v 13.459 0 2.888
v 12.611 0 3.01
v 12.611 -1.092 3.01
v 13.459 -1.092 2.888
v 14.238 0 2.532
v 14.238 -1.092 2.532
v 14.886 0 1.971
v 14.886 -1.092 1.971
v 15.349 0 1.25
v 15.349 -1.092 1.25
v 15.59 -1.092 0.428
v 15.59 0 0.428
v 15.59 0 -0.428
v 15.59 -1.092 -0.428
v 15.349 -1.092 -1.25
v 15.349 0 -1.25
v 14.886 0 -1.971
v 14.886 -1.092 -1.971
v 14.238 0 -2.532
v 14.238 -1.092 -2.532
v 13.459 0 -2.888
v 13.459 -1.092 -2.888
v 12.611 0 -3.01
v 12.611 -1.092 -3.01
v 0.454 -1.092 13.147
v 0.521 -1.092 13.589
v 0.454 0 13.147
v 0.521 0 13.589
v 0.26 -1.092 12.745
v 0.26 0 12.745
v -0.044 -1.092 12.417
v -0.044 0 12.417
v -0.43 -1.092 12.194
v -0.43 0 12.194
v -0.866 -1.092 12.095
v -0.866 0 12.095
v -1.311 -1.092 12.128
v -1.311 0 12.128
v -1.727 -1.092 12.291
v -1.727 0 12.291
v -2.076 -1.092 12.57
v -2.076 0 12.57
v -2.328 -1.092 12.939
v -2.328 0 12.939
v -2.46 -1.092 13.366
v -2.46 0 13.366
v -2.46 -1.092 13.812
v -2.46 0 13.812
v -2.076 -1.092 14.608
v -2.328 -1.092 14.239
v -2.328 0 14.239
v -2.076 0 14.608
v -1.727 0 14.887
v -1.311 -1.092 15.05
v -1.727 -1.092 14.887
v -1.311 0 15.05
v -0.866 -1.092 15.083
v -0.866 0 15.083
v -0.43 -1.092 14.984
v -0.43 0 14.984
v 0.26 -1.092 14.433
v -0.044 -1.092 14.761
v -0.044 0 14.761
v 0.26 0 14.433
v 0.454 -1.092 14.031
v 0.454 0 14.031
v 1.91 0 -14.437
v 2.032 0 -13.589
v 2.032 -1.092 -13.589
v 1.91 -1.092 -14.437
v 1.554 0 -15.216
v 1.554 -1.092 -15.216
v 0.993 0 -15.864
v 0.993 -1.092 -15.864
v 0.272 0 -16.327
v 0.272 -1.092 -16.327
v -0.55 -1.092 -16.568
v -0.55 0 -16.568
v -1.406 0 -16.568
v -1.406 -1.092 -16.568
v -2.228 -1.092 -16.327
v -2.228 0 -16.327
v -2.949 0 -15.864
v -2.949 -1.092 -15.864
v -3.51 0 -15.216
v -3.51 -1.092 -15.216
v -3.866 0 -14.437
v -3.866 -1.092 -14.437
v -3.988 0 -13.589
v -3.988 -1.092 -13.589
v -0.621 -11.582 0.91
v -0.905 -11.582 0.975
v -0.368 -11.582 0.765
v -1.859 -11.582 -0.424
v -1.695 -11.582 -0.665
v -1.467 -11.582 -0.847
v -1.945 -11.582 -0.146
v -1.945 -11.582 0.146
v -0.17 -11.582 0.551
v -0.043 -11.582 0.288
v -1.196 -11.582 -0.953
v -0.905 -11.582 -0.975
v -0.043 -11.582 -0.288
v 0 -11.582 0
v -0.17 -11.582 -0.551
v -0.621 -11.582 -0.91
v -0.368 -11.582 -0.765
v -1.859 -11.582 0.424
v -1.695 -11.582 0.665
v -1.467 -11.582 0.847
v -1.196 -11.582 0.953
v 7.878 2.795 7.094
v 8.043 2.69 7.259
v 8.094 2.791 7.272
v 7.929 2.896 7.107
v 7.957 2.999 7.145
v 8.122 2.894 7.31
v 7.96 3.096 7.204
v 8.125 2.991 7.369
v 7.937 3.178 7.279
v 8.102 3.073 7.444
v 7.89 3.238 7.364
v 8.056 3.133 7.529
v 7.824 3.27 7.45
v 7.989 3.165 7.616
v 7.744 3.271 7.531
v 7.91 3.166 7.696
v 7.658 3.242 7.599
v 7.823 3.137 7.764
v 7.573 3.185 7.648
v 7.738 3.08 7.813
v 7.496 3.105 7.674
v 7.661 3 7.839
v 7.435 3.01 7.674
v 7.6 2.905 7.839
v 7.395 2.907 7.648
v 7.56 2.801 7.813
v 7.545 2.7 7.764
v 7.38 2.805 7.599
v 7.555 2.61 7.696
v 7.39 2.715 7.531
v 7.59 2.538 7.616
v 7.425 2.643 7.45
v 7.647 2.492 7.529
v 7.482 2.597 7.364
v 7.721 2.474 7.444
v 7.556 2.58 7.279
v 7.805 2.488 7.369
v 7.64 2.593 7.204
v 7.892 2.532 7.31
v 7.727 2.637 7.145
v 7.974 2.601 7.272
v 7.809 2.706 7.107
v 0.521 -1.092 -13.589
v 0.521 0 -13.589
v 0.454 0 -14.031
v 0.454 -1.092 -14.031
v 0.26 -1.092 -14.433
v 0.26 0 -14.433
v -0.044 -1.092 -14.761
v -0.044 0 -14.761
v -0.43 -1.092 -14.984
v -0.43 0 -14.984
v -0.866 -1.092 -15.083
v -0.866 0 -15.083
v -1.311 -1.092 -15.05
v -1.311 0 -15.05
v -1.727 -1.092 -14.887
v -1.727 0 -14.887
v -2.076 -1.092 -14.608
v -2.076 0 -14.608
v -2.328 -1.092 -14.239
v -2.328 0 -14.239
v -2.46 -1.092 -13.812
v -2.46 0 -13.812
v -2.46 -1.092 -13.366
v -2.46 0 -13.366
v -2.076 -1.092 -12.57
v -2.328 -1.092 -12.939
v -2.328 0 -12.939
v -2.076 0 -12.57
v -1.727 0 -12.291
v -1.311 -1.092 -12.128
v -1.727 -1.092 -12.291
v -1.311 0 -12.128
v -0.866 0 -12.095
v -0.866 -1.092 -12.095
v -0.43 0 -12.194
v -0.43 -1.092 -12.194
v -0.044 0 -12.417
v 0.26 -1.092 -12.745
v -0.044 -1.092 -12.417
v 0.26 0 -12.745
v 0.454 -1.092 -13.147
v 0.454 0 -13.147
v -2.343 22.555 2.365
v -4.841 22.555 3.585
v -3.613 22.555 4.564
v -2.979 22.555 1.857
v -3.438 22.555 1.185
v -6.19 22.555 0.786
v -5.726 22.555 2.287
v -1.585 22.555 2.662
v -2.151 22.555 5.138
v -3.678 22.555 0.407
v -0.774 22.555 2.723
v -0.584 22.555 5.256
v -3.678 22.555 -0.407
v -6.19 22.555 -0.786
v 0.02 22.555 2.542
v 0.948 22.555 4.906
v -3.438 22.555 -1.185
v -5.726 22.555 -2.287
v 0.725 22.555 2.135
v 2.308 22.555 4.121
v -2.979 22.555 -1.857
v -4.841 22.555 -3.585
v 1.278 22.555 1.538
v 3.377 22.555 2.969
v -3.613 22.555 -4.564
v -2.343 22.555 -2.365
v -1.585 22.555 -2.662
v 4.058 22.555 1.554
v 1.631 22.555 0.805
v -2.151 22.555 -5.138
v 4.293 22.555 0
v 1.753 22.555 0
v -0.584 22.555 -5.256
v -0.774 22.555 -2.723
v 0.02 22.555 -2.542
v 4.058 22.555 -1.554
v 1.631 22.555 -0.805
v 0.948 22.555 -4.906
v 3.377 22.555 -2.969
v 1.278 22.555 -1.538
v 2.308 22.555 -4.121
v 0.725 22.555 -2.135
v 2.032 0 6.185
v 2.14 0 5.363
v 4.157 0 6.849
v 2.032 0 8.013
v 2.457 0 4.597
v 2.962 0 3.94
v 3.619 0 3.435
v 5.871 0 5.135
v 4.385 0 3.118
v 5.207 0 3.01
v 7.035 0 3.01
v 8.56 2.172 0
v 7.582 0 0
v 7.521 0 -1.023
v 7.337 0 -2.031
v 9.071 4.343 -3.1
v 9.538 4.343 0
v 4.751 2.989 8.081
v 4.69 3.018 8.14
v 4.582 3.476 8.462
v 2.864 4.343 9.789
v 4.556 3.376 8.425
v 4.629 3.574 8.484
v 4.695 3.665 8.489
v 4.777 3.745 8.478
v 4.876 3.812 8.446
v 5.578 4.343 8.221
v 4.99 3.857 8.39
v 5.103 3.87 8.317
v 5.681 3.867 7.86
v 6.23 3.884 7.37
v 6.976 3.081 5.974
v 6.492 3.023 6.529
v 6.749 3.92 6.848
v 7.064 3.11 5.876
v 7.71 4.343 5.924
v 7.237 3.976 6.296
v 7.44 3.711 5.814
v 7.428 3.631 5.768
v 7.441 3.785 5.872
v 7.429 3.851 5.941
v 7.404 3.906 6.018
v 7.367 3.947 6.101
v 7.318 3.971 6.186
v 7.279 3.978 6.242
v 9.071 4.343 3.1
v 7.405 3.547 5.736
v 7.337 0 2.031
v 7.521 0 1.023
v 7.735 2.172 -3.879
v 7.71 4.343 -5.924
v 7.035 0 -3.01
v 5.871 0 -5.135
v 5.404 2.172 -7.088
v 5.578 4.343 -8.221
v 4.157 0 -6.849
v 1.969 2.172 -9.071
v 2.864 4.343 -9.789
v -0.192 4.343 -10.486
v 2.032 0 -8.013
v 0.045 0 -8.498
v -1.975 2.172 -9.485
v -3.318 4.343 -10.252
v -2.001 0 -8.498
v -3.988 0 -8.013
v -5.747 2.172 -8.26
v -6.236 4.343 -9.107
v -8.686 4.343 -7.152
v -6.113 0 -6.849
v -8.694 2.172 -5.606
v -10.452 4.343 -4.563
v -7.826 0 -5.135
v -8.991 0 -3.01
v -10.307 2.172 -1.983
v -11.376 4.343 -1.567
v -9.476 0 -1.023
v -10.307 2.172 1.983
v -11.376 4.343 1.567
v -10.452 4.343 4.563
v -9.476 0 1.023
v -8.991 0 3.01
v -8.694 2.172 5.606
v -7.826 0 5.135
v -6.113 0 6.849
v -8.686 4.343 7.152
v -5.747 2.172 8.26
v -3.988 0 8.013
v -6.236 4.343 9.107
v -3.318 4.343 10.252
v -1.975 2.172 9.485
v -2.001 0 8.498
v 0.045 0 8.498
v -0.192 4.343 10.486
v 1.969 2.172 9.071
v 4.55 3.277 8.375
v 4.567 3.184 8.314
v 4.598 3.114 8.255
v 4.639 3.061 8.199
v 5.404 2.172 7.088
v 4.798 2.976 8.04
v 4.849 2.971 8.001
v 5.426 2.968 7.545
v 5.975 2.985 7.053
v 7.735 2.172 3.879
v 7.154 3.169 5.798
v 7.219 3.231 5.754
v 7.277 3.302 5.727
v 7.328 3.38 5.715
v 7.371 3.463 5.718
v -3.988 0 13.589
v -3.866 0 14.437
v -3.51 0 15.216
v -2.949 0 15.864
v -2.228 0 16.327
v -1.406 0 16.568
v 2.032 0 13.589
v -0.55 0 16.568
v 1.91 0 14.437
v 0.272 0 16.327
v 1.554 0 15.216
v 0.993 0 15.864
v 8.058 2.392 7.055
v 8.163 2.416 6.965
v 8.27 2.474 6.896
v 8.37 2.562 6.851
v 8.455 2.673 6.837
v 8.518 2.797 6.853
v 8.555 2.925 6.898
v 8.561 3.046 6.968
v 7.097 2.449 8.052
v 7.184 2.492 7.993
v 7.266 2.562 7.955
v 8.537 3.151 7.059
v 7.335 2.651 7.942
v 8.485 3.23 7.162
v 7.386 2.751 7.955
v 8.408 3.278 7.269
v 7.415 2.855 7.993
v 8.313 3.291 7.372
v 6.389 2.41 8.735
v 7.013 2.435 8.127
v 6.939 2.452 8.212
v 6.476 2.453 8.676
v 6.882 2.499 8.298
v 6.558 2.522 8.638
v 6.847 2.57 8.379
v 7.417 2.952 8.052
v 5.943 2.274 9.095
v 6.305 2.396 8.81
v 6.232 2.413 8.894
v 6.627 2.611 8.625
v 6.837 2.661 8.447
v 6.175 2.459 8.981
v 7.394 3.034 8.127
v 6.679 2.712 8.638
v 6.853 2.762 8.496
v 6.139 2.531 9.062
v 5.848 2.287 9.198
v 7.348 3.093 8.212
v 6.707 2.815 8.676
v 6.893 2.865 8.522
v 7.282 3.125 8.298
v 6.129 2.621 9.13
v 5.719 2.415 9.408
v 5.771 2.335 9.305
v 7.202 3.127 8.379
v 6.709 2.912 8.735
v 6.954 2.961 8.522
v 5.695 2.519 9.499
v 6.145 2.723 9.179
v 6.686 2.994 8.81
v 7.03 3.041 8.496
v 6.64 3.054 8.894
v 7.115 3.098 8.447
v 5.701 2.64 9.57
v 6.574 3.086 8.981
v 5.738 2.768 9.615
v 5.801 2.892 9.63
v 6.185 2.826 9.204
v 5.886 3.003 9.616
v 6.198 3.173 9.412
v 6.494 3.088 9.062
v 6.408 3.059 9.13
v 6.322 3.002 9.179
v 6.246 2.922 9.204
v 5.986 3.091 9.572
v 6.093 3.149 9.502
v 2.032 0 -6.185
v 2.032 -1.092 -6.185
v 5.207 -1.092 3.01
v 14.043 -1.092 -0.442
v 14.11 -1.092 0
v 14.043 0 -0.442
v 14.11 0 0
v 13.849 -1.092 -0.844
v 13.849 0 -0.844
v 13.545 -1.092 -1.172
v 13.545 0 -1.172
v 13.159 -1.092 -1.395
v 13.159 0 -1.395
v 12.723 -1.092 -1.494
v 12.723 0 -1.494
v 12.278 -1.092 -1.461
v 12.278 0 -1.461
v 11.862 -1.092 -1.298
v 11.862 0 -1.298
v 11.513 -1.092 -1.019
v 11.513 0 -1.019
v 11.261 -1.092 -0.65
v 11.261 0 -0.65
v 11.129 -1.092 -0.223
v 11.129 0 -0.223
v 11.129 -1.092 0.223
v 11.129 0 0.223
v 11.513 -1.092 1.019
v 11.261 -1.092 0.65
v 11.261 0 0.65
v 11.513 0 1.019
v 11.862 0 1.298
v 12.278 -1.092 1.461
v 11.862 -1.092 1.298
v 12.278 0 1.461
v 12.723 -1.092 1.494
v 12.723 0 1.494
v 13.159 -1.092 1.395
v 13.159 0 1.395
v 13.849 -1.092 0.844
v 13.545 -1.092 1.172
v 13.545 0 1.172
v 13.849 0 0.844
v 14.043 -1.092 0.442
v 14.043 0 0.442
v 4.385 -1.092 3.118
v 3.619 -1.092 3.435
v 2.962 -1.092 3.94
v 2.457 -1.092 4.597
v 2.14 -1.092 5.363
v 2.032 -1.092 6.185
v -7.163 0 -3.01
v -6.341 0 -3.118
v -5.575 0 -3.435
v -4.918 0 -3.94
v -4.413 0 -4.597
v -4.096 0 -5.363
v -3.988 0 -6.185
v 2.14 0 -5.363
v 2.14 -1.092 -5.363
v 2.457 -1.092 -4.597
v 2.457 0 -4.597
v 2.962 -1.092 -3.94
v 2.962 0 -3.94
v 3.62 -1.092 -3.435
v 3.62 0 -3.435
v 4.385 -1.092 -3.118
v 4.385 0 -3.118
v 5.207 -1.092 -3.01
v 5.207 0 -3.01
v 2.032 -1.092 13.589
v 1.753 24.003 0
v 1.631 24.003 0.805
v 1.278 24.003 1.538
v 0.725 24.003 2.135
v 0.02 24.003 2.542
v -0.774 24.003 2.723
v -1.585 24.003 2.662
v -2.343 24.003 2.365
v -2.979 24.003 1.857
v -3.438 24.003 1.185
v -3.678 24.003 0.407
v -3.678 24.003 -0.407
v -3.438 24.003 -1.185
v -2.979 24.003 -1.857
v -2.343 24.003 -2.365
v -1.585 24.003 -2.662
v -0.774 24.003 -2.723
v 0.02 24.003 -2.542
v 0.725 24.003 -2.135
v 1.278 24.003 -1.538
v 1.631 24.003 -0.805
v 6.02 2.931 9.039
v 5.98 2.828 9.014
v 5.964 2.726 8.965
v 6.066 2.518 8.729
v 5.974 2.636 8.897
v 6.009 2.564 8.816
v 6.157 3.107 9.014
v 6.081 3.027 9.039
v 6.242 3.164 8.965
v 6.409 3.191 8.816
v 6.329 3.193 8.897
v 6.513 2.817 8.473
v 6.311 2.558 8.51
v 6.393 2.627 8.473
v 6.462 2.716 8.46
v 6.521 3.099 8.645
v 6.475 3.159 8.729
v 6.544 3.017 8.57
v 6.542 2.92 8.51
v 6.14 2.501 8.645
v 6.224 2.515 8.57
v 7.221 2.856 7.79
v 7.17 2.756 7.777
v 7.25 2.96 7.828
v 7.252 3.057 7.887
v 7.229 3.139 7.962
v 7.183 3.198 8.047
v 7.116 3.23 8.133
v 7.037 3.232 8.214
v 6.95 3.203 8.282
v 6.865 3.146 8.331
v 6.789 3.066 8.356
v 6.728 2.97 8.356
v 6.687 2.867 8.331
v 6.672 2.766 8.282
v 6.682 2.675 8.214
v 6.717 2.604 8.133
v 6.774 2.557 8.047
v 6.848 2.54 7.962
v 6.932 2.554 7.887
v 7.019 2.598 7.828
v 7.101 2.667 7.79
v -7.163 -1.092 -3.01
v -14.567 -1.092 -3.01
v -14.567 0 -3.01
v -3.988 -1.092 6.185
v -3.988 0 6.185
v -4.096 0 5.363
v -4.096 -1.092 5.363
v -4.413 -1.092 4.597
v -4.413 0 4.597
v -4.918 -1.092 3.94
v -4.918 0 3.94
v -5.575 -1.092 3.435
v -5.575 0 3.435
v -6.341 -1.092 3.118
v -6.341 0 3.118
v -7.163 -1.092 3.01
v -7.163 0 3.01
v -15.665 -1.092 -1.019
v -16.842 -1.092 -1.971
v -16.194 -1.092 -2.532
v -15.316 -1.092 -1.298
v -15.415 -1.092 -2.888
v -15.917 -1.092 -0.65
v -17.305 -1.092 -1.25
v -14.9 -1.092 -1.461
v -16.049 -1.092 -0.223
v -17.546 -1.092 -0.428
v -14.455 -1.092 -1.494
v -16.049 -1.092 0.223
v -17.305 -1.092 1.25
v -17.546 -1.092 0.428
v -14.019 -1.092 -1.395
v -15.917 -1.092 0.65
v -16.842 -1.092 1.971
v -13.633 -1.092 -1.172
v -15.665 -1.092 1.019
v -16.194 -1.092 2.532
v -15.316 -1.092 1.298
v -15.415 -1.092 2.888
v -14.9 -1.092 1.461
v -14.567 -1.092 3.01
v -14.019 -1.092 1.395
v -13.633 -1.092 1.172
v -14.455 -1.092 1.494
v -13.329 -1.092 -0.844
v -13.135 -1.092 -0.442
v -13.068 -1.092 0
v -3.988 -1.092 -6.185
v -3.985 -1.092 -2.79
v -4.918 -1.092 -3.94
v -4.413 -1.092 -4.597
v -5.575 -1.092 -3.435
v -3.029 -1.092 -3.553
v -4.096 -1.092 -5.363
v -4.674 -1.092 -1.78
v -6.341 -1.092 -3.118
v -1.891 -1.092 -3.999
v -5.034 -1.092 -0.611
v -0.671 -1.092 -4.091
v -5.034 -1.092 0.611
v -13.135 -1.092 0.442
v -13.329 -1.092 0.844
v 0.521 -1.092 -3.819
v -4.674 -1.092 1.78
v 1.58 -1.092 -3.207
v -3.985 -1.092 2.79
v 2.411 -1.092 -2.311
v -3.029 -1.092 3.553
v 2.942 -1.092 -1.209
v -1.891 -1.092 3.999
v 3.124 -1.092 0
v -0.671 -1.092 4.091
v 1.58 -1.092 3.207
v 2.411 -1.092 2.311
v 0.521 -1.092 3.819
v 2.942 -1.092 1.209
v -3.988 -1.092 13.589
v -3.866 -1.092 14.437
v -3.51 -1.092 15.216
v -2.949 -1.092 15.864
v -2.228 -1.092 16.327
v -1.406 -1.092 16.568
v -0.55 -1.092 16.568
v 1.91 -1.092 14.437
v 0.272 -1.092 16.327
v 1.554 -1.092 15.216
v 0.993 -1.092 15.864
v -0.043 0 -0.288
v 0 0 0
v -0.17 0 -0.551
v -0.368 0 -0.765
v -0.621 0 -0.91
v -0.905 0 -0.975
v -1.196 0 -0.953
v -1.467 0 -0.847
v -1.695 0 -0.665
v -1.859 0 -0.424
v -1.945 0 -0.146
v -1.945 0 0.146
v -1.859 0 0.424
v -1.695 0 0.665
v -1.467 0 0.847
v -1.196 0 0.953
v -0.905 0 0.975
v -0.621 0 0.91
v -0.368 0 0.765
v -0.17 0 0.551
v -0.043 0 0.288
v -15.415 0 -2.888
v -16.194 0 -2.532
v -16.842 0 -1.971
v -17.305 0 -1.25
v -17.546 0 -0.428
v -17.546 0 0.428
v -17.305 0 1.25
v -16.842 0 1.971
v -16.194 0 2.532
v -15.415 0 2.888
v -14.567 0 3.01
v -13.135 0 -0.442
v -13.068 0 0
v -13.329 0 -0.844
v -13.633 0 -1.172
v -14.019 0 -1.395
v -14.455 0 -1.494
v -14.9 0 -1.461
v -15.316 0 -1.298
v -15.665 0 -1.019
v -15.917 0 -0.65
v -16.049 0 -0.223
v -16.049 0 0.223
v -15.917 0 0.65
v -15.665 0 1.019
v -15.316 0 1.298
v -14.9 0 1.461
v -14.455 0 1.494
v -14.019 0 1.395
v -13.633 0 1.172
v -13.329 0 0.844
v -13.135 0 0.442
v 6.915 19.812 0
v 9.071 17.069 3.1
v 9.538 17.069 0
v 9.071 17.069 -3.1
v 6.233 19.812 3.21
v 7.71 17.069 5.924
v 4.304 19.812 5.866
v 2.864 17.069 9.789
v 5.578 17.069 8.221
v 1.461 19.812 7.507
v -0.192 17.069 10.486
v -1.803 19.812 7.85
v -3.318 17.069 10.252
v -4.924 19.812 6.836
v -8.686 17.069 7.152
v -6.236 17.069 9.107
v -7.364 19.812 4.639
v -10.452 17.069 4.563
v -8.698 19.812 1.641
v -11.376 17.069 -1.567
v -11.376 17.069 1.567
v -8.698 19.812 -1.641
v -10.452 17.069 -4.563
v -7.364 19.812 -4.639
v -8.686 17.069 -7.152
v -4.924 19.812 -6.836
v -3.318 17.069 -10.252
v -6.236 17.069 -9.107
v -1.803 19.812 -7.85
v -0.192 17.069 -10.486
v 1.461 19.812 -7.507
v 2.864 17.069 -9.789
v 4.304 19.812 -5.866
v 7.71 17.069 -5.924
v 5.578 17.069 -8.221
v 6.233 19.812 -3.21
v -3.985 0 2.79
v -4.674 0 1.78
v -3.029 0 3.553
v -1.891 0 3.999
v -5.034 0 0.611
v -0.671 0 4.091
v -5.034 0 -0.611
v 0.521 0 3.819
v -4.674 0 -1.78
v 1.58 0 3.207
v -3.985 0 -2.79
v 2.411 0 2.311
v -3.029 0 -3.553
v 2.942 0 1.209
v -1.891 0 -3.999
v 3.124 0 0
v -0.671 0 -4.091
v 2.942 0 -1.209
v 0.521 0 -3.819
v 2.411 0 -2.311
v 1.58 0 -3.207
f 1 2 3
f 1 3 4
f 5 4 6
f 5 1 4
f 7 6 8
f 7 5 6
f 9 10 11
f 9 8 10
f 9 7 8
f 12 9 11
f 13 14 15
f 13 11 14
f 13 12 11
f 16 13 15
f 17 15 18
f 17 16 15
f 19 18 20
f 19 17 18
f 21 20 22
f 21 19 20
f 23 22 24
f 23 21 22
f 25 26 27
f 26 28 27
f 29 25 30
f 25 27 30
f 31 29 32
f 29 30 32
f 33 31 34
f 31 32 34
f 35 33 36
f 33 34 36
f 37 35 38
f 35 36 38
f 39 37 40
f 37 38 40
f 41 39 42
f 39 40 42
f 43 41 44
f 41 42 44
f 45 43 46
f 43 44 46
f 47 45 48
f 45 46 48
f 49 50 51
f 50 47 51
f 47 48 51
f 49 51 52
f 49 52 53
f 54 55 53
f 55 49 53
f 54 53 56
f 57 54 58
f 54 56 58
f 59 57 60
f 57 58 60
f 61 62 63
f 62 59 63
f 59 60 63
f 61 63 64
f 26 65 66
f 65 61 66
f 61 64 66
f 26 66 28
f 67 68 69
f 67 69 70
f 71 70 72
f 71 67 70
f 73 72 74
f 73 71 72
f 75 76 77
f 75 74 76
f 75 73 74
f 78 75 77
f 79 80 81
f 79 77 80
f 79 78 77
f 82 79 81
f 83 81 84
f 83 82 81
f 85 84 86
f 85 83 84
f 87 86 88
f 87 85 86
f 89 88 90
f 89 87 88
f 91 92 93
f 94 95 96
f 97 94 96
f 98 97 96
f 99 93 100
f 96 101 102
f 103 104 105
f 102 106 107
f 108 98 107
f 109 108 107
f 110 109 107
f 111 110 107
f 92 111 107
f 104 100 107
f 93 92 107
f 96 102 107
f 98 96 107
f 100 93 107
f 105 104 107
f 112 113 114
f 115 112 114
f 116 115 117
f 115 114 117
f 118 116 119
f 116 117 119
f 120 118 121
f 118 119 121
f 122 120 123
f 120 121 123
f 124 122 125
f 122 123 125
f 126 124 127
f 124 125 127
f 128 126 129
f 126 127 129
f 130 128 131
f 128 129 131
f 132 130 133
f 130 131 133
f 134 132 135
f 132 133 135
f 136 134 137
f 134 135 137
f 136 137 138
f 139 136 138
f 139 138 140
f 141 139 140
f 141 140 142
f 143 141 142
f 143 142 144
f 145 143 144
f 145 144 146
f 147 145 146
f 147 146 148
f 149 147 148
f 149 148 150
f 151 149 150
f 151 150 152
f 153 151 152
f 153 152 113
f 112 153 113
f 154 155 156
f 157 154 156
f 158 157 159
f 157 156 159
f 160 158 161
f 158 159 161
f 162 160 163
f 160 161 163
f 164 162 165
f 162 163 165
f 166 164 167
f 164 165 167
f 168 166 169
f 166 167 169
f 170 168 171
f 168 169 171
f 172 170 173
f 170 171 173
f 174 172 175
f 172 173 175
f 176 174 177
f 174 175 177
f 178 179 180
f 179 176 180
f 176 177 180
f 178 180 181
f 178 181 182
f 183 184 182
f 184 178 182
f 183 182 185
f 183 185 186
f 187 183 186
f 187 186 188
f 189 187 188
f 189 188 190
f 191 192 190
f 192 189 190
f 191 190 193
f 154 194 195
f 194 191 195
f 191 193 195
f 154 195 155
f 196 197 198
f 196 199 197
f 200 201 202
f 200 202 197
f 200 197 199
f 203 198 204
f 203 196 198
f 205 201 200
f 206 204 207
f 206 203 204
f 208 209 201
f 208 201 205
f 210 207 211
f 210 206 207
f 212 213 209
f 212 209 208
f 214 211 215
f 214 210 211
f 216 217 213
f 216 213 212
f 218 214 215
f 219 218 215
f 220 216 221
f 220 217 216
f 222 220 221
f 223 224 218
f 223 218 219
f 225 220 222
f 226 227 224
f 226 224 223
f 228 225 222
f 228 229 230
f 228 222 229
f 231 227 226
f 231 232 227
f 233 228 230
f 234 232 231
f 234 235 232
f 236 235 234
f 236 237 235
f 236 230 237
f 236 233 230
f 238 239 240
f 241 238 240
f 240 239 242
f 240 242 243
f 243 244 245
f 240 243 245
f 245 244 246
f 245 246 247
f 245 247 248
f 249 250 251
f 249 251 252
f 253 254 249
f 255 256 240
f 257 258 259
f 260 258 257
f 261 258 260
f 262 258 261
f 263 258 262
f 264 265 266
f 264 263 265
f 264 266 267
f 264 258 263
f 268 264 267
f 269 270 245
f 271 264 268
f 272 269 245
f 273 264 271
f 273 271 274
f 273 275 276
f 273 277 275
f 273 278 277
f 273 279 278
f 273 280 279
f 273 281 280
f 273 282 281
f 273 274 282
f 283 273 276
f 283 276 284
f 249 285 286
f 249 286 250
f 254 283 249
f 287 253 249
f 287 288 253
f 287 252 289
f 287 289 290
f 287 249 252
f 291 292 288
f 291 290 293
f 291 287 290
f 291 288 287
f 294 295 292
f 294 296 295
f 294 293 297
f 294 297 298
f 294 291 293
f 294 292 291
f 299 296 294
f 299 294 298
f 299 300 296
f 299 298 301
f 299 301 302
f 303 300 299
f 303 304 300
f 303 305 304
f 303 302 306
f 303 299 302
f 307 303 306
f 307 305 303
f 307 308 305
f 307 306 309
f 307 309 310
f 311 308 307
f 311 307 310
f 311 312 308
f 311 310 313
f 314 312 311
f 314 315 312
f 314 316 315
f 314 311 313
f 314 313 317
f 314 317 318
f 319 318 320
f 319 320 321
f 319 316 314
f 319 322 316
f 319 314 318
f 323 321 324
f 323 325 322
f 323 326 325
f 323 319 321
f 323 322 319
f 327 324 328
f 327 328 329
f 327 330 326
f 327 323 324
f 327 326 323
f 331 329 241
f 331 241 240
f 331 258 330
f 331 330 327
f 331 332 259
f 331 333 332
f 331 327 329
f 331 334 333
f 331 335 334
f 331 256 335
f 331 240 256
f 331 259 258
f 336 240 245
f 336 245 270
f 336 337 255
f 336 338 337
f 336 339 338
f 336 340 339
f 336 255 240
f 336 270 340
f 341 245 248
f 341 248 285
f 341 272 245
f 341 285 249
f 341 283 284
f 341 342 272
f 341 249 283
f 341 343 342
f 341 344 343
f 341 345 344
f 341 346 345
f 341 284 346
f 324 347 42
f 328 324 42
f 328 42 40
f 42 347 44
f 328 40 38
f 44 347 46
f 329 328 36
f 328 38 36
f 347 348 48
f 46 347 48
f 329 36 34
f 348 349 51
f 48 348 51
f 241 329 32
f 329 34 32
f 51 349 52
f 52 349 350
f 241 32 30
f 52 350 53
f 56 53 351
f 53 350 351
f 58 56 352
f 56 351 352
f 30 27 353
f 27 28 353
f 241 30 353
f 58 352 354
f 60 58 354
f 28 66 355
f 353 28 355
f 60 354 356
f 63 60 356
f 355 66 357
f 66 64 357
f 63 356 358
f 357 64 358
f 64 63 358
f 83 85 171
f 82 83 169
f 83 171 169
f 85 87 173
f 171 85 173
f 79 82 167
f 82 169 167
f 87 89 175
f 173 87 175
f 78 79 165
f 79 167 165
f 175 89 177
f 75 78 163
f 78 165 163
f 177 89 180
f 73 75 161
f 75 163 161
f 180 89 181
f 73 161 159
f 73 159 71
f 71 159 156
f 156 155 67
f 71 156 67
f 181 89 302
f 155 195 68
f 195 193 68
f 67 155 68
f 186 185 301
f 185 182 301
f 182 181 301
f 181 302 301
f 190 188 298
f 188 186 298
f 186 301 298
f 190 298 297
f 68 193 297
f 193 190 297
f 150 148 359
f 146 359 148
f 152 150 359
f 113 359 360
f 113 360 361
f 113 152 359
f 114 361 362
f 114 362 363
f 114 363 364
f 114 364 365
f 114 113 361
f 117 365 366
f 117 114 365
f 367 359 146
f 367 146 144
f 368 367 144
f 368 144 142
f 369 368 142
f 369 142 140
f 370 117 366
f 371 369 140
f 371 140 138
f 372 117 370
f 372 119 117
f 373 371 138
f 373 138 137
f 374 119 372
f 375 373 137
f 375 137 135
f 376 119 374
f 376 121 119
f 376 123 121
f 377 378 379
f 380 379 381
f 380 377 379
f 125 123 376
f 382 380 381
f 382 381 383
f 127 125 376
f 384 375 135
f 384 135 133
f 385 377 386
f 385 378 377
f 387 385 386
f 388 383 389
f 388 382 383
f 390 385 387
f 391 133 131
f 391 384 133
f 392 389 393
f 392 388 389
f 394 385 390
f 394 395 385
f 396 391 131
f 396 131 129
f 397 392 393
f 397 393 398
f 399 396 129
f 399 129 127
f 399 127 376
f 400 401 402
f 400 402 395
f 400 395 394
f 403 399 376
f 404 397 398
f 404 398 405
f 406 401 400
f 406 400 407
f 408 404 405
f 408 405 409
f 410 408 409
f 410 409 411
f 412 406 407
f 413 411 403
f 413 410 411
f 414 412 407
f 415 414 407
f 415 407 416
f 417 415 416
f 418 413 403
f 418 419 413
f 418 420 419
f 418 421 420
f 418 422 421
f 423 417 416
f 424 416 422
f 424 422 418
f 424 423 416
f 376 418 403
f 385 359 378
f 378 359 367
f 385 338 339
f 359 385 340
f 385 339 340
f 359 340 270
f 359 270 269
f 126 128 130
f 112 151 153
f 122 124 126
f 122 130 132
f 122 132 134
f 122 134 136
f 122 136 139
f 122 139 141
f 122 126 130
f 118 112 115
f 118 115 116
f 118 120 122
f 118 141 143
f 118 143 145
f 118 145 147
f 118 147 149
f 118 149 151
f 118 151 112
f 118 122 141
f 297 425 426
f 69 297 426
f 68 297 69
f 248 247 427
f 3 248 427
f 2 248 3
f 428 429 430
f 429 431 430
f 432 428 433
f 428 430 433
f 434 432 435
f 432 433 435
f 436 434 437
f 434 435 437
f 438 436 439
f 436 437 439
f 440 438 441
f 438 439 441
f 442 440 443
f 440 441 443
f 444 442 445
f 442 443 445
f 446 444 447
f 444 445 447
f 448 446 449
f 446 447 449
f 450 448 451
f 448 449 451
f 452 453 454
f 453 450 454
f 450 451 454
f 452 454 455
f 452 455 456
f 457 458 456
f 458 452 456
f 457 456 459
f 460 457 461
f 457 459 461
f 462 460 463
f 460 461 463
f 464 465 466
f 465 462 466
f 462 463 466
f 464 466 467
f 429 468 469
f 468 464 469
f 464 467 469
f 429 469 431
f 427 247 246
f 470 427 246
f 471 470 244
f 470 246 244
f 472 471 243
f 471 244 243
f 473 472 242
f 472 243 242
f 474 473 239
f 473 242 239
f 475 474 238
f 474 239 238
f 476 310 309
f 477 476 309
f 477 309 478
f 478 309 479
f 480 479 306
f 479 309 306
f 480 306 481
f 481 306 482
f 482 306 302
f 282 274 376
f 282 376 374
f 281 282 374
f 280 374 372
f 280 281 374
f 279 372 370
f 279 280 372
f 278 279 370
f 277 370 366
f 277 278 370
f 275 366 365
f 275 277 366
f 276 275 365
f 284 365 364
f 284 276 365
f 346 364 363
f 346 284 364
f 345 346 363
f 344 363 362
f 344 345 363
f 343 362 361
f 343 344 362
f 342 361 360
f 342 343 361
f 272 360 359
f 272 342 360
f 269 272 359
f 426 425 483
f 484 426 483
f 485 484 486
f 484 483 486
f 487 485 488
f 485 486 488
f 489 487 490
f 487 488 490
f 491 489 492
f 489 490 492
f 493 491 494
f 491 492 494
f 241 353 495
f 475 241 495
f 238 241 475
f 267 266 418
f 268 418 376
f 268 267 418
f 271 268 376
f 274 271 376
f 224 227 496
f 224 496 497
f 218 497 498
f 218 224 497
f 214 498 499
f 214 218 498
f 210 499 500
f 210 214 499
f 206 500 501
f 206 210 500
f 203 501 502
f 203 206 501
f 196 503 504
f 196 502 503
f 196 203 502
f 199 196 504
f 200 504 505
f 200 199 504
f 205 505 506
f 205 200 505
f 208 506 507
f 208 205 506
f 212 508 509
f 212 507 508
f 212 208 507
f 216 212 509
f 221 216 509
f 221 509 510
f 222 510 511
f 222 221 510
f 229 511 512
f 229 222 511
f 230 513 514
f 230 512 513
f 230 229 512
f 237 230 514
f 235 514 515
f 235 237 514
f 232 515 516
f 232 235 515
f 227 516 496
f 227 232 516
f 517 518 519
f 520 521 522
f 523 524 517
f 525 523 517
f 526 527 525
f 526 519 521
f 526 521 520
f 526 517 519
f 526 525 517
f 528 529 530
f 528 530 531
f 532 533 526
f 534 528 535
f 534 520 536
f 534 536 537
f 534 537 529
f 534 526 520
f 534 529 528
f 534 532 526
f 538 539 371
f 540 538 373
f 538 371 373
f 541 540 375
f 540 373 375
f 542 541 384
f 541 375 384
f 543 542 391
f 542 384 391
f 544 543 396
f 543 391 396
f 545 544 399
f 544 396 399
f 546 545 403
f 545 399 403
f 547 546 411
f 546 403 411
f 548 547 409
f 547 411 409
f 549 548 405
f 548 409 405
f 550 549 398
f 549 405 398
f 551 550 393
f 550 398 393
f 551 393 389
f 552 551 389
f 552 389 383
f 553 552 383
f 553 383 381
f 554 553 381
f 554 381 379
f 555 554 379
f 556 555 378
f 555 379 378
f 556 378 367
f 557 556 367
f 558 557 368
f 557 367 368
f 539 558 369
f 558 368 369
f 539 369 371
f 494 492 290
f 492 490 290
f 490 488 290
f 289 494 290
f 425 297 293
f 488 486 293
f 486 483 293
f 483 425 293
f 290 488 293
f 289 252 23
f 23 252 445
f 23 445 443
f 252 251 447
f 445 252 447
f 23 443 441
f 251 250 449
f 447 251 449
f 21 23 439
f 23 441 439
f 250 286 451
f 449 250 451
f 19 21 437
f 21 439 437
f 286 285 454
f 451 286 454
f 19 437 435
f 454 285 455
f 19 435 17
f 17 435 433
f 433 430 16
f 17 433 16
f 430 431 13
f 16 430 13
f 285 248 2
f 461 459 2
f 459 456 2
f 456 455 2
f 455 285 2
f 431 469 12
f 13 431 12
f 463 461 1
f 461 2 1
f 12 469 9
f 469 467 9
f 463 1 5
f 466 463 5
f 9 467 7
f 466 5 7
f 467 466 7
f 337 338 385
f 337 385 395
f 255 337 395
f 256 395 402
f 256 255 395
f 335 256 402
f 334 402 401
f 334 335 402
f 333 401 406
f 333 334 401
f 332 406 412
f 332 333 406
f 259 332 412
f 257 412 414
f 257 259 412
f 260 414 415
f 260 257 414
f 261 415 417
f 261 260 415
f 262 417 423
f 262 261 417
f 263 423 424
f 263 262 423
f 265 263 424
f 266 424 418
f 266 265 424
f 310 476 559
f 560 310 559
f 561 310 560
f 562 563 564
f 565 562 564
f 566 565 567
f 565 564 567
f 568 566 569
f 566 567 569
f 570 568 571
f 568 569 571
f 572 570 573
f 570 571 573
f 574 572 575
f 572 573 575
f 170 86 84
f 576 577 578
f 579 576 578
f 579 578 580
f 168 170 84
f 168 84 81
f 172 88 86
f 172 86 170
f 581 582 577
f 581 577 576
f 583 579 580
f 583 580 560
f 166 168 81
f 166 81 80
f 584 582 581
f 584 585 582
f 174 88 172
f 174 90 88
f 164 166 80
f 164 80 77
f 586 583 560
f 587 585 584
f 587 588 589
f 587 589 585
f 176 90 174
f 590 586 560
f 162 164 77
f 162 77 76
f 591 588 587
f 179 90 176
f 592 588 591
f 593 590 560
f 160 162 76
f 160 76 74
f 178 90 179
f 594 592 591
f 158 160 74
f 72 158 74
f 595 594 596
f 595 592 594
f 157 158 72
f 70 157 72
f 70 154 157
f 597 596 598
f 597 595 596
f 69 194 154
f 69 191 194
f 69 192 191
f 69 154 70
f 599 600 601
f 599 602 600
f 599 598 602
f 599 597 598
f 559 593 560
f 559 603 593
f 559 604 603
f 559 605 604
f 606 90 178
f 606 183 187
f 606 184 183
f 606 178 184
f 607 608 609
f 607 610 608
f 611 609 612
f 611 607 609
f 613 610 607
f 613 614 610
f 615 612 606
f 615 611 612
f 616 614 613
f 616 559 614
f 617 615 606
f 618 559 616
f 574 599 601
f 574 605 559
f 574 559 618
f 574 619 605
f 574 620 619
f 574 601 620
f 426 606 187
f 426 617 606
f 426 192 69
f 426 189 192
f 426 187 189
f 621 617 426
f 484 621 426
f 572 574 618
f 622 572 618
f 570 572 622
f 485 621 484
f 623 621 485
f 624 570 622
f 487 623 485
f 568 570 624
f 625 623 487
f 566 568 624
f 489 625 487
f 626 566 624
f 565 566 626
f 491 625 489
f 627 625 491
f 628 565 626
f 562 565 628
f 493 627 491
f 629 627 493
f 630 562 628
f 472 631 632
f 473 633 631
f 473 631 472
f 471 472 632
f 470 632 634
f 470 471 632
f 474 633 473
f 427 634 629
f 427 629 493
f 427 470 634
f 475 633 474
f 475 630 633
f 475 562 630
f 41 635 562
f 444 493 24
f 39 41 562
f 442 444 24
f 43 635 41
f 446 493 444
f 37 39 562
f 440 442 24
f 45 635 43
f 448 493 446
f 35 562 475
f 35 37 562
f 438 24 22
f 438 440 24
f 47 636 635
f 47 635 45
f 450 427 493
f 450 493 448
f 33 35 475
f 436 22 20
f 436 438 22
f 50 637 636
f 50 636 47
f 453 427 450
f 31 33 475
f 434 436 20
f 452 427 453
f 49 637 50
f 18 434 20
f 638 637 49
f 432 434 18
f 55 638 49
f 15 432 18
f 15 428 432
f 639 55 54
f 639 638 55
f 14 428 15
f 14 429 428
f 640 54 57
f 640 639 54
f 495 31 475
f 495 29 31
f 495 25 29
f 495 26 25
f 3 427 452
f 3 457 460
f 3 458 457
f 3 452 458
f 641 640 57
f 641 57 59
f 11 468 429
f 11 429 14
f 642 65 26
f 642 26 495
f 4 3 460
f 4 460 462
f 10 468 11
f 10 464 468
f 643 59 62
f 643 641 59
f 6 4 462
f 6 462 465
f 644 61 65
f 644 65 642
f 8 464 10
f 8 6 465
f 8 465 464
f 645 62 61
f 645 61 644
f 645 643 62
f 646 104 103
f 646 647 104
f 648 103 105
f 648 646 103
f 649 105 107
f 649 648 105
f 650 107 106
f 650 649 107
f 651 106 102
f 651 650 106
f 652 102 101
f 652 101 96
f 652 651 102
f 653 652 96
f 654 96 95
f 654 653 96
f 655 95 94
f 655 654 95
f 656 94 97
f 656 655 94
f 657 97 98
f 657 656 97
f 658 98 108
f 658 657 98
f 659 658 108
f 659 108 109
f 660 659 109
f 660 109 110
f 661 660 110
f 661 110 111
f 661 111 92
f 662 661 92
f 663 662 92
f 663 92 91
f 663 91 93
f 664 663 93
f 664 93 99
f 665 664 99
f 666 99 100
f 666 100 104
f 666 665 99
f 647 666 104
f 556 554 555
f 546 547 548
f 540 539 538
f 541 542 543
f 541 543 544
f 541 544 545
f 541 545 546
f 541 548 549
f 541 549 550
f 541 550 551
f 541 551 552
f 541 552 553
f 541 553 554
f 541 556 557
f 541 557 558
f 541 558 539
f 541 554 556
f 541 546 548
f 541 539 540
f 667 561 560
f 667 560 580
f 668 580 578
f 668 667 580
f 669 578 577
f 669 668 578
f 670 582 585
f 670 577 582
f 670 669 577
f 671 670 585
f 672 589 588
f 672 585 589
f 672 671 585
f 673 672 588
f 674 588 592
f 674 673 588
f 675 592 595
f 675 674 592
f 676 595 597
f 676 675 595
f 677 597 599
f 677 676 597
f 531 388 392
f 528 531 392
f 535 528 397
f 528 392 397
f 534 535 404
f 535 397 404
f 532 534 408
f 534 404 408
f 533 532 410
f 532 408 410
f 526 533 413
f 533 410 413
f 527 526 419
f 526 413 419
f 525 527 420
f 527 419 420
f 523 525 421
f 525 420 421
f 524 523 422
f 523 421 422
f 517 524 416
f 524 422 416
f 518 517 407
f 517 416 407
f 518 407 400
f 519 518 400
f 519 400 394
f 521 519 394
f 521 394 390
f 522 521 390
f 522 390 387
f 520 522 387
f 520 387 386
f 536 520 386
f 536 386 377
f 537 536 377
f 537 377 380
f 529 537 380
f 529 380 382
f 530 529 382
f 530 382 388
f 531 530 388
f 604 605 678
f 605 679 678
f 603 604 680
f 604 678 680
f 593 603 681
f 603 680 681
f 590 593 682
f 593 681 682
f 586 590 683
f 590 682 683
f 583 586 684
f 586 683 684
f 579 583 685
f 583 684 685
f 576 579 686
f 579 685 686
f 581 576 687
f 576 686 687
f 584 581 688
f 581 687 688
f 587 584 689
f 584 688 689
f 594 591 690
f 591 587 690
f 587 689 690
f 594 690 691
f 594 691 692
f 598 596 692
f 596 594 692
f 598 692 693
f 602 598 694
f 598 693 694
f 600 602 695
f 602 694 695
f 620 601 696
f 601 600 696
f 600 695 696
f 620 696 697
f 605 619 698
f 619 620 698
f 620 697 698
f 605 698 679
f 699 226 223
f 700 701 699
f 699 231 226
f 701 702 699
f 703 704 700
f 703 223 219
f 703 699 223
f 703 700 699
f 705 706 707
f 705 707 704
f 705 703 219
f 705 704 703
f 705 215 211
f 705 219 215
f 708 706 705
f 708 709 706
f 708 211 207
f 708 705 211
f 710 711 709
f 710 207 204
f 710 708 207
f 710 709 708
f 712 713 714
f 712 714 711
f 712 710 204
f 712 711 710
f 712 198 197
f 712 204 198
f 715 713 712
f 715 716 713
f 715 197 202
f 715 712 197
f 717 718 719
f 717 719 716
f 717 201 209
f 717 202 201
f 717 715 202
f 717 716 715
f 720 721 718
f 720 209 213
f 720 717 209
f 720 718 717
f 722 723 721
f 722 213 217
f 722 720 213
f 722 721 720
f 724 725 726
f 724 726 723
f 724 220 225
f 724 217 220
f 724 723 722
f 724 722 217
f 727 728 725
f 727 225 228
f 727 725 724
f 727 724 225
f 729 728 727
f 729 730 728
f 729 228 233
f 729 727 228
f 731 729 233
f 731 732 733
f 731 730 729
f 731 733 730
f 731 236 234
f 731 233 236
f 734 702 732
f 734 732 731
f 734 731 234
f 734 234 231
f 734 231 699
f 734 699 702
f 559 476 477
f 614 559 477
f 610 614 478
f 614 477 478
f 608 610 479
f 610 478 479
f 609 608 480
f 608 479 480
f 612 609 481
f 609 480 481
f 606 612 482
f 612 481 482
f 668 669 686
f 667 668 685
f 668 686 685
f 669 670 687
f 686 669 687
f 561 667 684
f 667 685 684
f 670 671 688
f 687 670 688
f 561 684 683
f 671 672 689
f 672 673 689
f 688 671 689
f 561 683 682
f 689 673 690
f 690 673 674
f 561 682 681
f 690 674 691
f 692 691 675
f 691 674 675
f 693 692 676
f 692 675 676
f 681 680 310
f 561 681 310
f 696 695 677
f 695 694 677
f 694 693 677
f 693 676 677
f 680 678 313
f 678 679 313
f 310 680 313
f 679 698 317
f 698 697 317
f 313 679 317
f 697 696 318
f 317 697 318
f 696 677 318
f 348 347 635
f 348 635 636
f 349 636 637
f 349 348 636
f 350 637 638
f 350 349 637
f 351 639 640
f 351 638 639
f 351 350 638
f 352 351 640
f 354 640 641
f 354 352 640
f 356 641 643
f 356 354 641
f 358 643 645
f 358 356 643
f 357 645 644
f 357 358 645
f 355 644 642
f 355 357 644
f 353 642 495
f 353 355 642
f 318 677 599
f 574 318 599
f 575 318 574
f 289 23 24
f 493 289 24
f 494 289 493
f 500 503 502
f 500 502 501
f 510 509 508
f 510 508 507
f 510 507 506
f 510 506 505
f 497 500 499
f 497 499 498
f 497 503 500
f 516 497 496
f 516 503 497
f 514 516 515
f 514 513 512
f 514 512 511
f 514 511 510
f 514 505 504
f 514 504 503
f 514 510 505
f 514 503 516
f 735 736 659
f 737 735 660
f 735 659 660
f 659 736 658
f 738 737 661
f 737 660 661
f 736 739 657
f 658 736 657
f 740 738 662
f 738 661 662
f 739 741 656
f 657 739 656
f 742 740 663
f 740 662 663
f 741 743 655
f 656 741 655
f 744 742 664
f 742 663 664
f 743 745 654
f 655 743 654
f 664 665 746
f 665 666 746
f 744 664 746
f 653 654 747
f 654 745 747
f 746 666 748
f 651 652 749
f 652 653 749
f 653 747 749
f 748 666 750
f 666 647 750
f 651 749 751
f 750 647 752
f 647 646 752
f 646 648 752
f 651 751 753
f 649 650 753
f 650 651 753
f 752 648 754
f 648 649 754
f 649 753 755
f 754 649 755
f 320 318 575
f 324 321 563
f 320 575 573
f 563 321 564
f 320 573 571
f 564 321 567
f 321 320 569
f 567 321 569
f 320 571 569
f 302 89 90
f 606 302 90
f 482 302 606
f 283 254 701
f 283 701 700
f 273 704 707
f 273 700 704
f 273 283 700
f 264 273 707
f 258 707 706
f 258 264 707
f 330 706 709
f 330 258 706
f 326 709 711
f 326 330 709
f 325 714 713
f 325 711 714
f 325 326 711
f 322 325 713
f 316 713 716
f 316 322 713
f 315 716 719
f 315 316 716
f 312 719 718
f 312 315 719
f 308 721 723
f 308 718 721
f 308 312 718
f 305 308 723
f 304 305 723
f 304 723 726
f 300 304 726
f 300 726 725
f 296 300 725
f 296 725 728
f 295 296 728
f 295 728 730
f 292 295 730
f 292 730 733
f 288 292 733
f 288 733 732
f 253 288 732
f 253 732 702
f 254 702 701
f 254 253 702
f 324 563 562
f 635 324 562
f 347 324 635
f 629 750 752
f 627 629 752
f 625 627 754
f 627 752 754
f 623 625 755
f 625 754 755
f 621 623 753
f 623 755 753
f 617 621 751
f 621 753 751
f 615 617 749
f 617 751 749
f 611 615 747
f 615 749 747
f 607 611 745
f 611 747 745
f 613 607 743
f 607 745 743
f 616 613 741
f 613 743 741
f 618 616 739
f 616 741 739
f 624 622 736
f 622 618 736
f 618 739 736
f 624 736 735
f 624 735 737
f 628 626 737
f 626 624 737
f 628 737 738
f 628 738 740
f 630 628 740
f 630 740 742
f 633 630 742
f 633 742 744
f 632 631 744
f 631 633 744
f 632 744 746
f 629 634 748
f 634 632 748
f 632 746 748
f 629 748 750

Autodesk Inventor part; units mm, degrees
ref_plane "YZ Plane" through (0, 0, 0) normal (1, 0, 0) x (0, 1, 0)
ref_plane "XZ Plane" through (0, 0, 0) normal (0, 1, 0) x (-1, 0, 0)
sketch "Sketch1" plane through (0, 0, 0) normal (0, 0, 1) x (1, 0, 0)
  line L0 (-0.9779, 24.003) -> (1.7526, 24.003)
  line L1 (1.7526, 24.003) -> (1.7526, 22.5552)
  line L2 (1.7526, 22.5552) -> (4.2926, 22.5552)
  line L3 (4.2926, 22.5552) -> (9.5377, 17.0688)
  line L4 (9.5377, 17.0688) -> (9.5377, 4.3434)
  line L5 (9.5377, 4.3434) -> (7.5819, 0)
  line L6 (7.5819, 0) -> (0, 0)
  line L7 (-0.9779, -11.5824) -> (-0.9779, 24.003)
  line L8 (-0.9779, -8.6887) -> (-0.9779, -11.5824)
  line L9 (-0.9779, -11.5824) -> (0, -11.5824)
  line L10 (0, -11.5824) -> (0, 0)
  dimension "d0" = 24.003
  dimension "d1" = 10.5156
  dimension "d2" = 22.5552
  dimension "d3" = 17.0688
  dimension "d4" = 4.3434
  dimension "d5" = 2.7305
  dimension "d6" = 11.5824
  dimension "d7" = 0.9779
  dimension "d9" = 5.2705
  dimension "d10" = 8.5598
revolve "Revolution1" add sketch "Sketch1" angle 360 about axis through (-0.9779, -11.5824, 0) along (0, 1, 0)
sketch "Sketch2" plane through (-0.9779, 0, 0) normal (0, -1, 0) x (1, 0, 0)
  circle A0 centre (0, 0) radius 0.9779 projected
  circle A1 centre (0, 0) radius 8.5598 projected
  line L0 (6.1849, 3.0099) -> (13.589, 3.0099)
  line L1 (16.5989, 0) -> (16.5989, 0)
  line L2 (13.589, -3.0099) -> (6.1849, -3.0099)
  line L3 (3.0099, -6.1849) -> (3.0099, -13.589)
  line L4 (0, -16.5989) -> (0, -16.5989)
  line L5 (-3.0099, -13.589) -> (-3.0099, -6.1849)
  line L6 (-6.1849, -3.0099) -> (-13.589, -3.0099)
  line L7 (-16.5989, 0) -> (-16.5989, 0)
  line L8 (-13.589, 3.0099) -> (-6.1849, 3.0099)
  line L9 (-3.0099, 6.1849) -> (-3.0099, 13.589)
  line L10 (0, 16.5989) -> (0, 16.5989)
  line L11 (3.0099, 13.589) -> (3.0099, 6.1849)
  arc A2 (-6.1849, 3.0099) -> (-3.0099, 6.1849) centre (-6.1849, 6.1849) ccw
  arc A3 (3.0099, 6.1849) -> (6.1849, 3.0099) centre (6.1849, 6.1849) ccw
  arc A4 (6.1849, -3.0099) -> (3.0099, -6.1849) centre (6.1849, -6.1849) ccw
  arc A5 (-3.0099, -6.1849) -> (-6.1849, -3.0099) centre (-6.1849, -6.1849) ccw
  arc A6 (16.5989, 0) -> (13.589, 3.0099) centre (13.589, 0) ccw
  arc A7 (13.589, -3.0099) -> (16.5989, 0) centre (13.589, 0) ccw
  arc A8 (-13.589, 3.0099) -> (-16.5989, 0) centre (-13.589, 0) ccw
  arc A9 (-16.5989, 0) -> (-13.589, -3.0099) centre (-13.589, 0) ccw
  arc A10 (-3.0099, -13.589) -> (0, -16.5989) centre (0, -13.589) ccw
  arc A11 (0, -16.5989) -> (3.0099, -13.589) centre (0, -13.589) ccw
  arc A12 (0, 16.5989) -> (-3.0099, 13.589) centre (0, 13.589) ccw
  arc A13 (3.0099, 13.589) -> (0, 16.5989) centre (0, 13.589) ccw
  circle A14 centre (0, 0) radius 4.1021
  circle A15 centre (0, 13.589) radius 1.4986
  circle A16 centre (13.589, 0) radius 1.4986
  circle A17 centre (-13.589, 0) radius 1.4986
  circle A18 centre (0, -13.589) radius 1.4986
  point P0 (0.9779, 0)
  dimension "d15" = 6.0198
  dimension "d16" = 3.175
  dimension "d17" = 3.0099
  dimension "d18" = 13.589
  dimension "d19" = 13.589
  dimension "d20" = 13.589
  dimension "d21" = 8.2042
  dimension "d22" = 2.9972
extrude "Extrusion1" add sketch "Sketch2" along normal blind 1.0922 contours A1 L2 A4 L3 L5 A5 L6 L8 A2 L9 L11 A3 L0 | A1 L0 A6 A7 L2 | A1 L9 A12 A13 L11 | L3 A11 A10 L5 A1 | A1 L6 A9 A8 L8
ref_plane "Work Plane1" through (5.0748, 0, 6.0527) normal (0.6448, -0.4106, 0.6448) x (0.5371, 0.8435, 0)
sketch "Sketch3" plane through (5.0748, 0, 6.0527) normal (0.6448, -0.4106, 0.6448) x (0.5371, 0.8435, 0)
  line L0 (3.28, 3.0554) -> (4.5151, 0.3869)
  line L1 (2.3848, 2.6411) -> (3.62, -0.0274)
  arc A0 (3.28, 3.0554) -> (2.3848, 2.6411) centre (2.8324, 2.8483) ccw
  arc A1 (3.62, -0.0274) -> (4.5151, 0.3869) centre (4.0675, 0.1797) ccw
  point P0 (-2.7259, -1.8667)
extrude "Extrusion2" add sketch "Sketch3" along normal blind 1.5875 and the other way blind 0.254
sketch "Sketch4" plane through (6.0983, -0.6518, 7.0762) normal (0.6448, -0.4106, 0.6448) x (0.5438, -0.3463, -0.7644)
  arc A0 (0.0274, 3.62) -> (-0.3869, 4.5151) centre (-0.1797, 4.0675) ccw projected
  arc A1 (-3.0554, 3.28) -> (-2.6411, 2.3848) centre (-2.8483, 2.8324) ccw projected
  line L0 (0.0274, 3.62) -> (-2.6411, 2.3848) projected
  circle A2 centre (-2.4072, 3.0365) radius 0.3811
  circle A3 centre (-1.514, 3.45) radius 0.3811
  circle A4 centre (-0.6208, 3.8634) radius 0.3811
  line L1 (-2.8483, 2.8324) -> (-0.1797, 4.0675) construction
  line L2 (-2.4072, 3.0365) -> (-1.514, 3.45)
  line L3 (-1.514, 3.45) -> (-0.6208, 3.8634)
  line L4 (-2.4072, 3.0365) -> (-2.8483, 2.8324) construction
  line L5 (-2.4072, 3.0365) -> (-2.8483, 2.8324) construction
  line L6 (-0.6208, 3.8634) -> (-0.1797, 4.0675) construction
  point P0 (1.8667, -2.7259)
extrude "Extrusion3" cut sketch "Sketch4" against normal blind 0.254
sketch "Sketch5" plane through (7.6722, 2.9262, 7.387) normal (0.6448, -0.4106, 0.6448) x (0.7071, 0, -0.7071)
  circle A0 centre (0, 0) radius 0.3811 construction
sketch "Sketch6" plane through (6.9643, 2.8868, 8.0698) normal (0.6448, -0.4106, 0.6448) x (0.7071, 0, -0.7071)
  circle A0 centre (0, 0) radius 0.3811 construction
sketch "Sketch7" plane through (6.2565, 2.8475, 8.7525) normal (0.6448, -0.4106, 0.6448) x (0.7071, 0, -0.7071)
  circle A0 centre (0, 0) radius 0.3811 construction
equation "\"d19\" = d18"
equation "\"d20\" = d18"
properties part number "Thrust_Motor"
